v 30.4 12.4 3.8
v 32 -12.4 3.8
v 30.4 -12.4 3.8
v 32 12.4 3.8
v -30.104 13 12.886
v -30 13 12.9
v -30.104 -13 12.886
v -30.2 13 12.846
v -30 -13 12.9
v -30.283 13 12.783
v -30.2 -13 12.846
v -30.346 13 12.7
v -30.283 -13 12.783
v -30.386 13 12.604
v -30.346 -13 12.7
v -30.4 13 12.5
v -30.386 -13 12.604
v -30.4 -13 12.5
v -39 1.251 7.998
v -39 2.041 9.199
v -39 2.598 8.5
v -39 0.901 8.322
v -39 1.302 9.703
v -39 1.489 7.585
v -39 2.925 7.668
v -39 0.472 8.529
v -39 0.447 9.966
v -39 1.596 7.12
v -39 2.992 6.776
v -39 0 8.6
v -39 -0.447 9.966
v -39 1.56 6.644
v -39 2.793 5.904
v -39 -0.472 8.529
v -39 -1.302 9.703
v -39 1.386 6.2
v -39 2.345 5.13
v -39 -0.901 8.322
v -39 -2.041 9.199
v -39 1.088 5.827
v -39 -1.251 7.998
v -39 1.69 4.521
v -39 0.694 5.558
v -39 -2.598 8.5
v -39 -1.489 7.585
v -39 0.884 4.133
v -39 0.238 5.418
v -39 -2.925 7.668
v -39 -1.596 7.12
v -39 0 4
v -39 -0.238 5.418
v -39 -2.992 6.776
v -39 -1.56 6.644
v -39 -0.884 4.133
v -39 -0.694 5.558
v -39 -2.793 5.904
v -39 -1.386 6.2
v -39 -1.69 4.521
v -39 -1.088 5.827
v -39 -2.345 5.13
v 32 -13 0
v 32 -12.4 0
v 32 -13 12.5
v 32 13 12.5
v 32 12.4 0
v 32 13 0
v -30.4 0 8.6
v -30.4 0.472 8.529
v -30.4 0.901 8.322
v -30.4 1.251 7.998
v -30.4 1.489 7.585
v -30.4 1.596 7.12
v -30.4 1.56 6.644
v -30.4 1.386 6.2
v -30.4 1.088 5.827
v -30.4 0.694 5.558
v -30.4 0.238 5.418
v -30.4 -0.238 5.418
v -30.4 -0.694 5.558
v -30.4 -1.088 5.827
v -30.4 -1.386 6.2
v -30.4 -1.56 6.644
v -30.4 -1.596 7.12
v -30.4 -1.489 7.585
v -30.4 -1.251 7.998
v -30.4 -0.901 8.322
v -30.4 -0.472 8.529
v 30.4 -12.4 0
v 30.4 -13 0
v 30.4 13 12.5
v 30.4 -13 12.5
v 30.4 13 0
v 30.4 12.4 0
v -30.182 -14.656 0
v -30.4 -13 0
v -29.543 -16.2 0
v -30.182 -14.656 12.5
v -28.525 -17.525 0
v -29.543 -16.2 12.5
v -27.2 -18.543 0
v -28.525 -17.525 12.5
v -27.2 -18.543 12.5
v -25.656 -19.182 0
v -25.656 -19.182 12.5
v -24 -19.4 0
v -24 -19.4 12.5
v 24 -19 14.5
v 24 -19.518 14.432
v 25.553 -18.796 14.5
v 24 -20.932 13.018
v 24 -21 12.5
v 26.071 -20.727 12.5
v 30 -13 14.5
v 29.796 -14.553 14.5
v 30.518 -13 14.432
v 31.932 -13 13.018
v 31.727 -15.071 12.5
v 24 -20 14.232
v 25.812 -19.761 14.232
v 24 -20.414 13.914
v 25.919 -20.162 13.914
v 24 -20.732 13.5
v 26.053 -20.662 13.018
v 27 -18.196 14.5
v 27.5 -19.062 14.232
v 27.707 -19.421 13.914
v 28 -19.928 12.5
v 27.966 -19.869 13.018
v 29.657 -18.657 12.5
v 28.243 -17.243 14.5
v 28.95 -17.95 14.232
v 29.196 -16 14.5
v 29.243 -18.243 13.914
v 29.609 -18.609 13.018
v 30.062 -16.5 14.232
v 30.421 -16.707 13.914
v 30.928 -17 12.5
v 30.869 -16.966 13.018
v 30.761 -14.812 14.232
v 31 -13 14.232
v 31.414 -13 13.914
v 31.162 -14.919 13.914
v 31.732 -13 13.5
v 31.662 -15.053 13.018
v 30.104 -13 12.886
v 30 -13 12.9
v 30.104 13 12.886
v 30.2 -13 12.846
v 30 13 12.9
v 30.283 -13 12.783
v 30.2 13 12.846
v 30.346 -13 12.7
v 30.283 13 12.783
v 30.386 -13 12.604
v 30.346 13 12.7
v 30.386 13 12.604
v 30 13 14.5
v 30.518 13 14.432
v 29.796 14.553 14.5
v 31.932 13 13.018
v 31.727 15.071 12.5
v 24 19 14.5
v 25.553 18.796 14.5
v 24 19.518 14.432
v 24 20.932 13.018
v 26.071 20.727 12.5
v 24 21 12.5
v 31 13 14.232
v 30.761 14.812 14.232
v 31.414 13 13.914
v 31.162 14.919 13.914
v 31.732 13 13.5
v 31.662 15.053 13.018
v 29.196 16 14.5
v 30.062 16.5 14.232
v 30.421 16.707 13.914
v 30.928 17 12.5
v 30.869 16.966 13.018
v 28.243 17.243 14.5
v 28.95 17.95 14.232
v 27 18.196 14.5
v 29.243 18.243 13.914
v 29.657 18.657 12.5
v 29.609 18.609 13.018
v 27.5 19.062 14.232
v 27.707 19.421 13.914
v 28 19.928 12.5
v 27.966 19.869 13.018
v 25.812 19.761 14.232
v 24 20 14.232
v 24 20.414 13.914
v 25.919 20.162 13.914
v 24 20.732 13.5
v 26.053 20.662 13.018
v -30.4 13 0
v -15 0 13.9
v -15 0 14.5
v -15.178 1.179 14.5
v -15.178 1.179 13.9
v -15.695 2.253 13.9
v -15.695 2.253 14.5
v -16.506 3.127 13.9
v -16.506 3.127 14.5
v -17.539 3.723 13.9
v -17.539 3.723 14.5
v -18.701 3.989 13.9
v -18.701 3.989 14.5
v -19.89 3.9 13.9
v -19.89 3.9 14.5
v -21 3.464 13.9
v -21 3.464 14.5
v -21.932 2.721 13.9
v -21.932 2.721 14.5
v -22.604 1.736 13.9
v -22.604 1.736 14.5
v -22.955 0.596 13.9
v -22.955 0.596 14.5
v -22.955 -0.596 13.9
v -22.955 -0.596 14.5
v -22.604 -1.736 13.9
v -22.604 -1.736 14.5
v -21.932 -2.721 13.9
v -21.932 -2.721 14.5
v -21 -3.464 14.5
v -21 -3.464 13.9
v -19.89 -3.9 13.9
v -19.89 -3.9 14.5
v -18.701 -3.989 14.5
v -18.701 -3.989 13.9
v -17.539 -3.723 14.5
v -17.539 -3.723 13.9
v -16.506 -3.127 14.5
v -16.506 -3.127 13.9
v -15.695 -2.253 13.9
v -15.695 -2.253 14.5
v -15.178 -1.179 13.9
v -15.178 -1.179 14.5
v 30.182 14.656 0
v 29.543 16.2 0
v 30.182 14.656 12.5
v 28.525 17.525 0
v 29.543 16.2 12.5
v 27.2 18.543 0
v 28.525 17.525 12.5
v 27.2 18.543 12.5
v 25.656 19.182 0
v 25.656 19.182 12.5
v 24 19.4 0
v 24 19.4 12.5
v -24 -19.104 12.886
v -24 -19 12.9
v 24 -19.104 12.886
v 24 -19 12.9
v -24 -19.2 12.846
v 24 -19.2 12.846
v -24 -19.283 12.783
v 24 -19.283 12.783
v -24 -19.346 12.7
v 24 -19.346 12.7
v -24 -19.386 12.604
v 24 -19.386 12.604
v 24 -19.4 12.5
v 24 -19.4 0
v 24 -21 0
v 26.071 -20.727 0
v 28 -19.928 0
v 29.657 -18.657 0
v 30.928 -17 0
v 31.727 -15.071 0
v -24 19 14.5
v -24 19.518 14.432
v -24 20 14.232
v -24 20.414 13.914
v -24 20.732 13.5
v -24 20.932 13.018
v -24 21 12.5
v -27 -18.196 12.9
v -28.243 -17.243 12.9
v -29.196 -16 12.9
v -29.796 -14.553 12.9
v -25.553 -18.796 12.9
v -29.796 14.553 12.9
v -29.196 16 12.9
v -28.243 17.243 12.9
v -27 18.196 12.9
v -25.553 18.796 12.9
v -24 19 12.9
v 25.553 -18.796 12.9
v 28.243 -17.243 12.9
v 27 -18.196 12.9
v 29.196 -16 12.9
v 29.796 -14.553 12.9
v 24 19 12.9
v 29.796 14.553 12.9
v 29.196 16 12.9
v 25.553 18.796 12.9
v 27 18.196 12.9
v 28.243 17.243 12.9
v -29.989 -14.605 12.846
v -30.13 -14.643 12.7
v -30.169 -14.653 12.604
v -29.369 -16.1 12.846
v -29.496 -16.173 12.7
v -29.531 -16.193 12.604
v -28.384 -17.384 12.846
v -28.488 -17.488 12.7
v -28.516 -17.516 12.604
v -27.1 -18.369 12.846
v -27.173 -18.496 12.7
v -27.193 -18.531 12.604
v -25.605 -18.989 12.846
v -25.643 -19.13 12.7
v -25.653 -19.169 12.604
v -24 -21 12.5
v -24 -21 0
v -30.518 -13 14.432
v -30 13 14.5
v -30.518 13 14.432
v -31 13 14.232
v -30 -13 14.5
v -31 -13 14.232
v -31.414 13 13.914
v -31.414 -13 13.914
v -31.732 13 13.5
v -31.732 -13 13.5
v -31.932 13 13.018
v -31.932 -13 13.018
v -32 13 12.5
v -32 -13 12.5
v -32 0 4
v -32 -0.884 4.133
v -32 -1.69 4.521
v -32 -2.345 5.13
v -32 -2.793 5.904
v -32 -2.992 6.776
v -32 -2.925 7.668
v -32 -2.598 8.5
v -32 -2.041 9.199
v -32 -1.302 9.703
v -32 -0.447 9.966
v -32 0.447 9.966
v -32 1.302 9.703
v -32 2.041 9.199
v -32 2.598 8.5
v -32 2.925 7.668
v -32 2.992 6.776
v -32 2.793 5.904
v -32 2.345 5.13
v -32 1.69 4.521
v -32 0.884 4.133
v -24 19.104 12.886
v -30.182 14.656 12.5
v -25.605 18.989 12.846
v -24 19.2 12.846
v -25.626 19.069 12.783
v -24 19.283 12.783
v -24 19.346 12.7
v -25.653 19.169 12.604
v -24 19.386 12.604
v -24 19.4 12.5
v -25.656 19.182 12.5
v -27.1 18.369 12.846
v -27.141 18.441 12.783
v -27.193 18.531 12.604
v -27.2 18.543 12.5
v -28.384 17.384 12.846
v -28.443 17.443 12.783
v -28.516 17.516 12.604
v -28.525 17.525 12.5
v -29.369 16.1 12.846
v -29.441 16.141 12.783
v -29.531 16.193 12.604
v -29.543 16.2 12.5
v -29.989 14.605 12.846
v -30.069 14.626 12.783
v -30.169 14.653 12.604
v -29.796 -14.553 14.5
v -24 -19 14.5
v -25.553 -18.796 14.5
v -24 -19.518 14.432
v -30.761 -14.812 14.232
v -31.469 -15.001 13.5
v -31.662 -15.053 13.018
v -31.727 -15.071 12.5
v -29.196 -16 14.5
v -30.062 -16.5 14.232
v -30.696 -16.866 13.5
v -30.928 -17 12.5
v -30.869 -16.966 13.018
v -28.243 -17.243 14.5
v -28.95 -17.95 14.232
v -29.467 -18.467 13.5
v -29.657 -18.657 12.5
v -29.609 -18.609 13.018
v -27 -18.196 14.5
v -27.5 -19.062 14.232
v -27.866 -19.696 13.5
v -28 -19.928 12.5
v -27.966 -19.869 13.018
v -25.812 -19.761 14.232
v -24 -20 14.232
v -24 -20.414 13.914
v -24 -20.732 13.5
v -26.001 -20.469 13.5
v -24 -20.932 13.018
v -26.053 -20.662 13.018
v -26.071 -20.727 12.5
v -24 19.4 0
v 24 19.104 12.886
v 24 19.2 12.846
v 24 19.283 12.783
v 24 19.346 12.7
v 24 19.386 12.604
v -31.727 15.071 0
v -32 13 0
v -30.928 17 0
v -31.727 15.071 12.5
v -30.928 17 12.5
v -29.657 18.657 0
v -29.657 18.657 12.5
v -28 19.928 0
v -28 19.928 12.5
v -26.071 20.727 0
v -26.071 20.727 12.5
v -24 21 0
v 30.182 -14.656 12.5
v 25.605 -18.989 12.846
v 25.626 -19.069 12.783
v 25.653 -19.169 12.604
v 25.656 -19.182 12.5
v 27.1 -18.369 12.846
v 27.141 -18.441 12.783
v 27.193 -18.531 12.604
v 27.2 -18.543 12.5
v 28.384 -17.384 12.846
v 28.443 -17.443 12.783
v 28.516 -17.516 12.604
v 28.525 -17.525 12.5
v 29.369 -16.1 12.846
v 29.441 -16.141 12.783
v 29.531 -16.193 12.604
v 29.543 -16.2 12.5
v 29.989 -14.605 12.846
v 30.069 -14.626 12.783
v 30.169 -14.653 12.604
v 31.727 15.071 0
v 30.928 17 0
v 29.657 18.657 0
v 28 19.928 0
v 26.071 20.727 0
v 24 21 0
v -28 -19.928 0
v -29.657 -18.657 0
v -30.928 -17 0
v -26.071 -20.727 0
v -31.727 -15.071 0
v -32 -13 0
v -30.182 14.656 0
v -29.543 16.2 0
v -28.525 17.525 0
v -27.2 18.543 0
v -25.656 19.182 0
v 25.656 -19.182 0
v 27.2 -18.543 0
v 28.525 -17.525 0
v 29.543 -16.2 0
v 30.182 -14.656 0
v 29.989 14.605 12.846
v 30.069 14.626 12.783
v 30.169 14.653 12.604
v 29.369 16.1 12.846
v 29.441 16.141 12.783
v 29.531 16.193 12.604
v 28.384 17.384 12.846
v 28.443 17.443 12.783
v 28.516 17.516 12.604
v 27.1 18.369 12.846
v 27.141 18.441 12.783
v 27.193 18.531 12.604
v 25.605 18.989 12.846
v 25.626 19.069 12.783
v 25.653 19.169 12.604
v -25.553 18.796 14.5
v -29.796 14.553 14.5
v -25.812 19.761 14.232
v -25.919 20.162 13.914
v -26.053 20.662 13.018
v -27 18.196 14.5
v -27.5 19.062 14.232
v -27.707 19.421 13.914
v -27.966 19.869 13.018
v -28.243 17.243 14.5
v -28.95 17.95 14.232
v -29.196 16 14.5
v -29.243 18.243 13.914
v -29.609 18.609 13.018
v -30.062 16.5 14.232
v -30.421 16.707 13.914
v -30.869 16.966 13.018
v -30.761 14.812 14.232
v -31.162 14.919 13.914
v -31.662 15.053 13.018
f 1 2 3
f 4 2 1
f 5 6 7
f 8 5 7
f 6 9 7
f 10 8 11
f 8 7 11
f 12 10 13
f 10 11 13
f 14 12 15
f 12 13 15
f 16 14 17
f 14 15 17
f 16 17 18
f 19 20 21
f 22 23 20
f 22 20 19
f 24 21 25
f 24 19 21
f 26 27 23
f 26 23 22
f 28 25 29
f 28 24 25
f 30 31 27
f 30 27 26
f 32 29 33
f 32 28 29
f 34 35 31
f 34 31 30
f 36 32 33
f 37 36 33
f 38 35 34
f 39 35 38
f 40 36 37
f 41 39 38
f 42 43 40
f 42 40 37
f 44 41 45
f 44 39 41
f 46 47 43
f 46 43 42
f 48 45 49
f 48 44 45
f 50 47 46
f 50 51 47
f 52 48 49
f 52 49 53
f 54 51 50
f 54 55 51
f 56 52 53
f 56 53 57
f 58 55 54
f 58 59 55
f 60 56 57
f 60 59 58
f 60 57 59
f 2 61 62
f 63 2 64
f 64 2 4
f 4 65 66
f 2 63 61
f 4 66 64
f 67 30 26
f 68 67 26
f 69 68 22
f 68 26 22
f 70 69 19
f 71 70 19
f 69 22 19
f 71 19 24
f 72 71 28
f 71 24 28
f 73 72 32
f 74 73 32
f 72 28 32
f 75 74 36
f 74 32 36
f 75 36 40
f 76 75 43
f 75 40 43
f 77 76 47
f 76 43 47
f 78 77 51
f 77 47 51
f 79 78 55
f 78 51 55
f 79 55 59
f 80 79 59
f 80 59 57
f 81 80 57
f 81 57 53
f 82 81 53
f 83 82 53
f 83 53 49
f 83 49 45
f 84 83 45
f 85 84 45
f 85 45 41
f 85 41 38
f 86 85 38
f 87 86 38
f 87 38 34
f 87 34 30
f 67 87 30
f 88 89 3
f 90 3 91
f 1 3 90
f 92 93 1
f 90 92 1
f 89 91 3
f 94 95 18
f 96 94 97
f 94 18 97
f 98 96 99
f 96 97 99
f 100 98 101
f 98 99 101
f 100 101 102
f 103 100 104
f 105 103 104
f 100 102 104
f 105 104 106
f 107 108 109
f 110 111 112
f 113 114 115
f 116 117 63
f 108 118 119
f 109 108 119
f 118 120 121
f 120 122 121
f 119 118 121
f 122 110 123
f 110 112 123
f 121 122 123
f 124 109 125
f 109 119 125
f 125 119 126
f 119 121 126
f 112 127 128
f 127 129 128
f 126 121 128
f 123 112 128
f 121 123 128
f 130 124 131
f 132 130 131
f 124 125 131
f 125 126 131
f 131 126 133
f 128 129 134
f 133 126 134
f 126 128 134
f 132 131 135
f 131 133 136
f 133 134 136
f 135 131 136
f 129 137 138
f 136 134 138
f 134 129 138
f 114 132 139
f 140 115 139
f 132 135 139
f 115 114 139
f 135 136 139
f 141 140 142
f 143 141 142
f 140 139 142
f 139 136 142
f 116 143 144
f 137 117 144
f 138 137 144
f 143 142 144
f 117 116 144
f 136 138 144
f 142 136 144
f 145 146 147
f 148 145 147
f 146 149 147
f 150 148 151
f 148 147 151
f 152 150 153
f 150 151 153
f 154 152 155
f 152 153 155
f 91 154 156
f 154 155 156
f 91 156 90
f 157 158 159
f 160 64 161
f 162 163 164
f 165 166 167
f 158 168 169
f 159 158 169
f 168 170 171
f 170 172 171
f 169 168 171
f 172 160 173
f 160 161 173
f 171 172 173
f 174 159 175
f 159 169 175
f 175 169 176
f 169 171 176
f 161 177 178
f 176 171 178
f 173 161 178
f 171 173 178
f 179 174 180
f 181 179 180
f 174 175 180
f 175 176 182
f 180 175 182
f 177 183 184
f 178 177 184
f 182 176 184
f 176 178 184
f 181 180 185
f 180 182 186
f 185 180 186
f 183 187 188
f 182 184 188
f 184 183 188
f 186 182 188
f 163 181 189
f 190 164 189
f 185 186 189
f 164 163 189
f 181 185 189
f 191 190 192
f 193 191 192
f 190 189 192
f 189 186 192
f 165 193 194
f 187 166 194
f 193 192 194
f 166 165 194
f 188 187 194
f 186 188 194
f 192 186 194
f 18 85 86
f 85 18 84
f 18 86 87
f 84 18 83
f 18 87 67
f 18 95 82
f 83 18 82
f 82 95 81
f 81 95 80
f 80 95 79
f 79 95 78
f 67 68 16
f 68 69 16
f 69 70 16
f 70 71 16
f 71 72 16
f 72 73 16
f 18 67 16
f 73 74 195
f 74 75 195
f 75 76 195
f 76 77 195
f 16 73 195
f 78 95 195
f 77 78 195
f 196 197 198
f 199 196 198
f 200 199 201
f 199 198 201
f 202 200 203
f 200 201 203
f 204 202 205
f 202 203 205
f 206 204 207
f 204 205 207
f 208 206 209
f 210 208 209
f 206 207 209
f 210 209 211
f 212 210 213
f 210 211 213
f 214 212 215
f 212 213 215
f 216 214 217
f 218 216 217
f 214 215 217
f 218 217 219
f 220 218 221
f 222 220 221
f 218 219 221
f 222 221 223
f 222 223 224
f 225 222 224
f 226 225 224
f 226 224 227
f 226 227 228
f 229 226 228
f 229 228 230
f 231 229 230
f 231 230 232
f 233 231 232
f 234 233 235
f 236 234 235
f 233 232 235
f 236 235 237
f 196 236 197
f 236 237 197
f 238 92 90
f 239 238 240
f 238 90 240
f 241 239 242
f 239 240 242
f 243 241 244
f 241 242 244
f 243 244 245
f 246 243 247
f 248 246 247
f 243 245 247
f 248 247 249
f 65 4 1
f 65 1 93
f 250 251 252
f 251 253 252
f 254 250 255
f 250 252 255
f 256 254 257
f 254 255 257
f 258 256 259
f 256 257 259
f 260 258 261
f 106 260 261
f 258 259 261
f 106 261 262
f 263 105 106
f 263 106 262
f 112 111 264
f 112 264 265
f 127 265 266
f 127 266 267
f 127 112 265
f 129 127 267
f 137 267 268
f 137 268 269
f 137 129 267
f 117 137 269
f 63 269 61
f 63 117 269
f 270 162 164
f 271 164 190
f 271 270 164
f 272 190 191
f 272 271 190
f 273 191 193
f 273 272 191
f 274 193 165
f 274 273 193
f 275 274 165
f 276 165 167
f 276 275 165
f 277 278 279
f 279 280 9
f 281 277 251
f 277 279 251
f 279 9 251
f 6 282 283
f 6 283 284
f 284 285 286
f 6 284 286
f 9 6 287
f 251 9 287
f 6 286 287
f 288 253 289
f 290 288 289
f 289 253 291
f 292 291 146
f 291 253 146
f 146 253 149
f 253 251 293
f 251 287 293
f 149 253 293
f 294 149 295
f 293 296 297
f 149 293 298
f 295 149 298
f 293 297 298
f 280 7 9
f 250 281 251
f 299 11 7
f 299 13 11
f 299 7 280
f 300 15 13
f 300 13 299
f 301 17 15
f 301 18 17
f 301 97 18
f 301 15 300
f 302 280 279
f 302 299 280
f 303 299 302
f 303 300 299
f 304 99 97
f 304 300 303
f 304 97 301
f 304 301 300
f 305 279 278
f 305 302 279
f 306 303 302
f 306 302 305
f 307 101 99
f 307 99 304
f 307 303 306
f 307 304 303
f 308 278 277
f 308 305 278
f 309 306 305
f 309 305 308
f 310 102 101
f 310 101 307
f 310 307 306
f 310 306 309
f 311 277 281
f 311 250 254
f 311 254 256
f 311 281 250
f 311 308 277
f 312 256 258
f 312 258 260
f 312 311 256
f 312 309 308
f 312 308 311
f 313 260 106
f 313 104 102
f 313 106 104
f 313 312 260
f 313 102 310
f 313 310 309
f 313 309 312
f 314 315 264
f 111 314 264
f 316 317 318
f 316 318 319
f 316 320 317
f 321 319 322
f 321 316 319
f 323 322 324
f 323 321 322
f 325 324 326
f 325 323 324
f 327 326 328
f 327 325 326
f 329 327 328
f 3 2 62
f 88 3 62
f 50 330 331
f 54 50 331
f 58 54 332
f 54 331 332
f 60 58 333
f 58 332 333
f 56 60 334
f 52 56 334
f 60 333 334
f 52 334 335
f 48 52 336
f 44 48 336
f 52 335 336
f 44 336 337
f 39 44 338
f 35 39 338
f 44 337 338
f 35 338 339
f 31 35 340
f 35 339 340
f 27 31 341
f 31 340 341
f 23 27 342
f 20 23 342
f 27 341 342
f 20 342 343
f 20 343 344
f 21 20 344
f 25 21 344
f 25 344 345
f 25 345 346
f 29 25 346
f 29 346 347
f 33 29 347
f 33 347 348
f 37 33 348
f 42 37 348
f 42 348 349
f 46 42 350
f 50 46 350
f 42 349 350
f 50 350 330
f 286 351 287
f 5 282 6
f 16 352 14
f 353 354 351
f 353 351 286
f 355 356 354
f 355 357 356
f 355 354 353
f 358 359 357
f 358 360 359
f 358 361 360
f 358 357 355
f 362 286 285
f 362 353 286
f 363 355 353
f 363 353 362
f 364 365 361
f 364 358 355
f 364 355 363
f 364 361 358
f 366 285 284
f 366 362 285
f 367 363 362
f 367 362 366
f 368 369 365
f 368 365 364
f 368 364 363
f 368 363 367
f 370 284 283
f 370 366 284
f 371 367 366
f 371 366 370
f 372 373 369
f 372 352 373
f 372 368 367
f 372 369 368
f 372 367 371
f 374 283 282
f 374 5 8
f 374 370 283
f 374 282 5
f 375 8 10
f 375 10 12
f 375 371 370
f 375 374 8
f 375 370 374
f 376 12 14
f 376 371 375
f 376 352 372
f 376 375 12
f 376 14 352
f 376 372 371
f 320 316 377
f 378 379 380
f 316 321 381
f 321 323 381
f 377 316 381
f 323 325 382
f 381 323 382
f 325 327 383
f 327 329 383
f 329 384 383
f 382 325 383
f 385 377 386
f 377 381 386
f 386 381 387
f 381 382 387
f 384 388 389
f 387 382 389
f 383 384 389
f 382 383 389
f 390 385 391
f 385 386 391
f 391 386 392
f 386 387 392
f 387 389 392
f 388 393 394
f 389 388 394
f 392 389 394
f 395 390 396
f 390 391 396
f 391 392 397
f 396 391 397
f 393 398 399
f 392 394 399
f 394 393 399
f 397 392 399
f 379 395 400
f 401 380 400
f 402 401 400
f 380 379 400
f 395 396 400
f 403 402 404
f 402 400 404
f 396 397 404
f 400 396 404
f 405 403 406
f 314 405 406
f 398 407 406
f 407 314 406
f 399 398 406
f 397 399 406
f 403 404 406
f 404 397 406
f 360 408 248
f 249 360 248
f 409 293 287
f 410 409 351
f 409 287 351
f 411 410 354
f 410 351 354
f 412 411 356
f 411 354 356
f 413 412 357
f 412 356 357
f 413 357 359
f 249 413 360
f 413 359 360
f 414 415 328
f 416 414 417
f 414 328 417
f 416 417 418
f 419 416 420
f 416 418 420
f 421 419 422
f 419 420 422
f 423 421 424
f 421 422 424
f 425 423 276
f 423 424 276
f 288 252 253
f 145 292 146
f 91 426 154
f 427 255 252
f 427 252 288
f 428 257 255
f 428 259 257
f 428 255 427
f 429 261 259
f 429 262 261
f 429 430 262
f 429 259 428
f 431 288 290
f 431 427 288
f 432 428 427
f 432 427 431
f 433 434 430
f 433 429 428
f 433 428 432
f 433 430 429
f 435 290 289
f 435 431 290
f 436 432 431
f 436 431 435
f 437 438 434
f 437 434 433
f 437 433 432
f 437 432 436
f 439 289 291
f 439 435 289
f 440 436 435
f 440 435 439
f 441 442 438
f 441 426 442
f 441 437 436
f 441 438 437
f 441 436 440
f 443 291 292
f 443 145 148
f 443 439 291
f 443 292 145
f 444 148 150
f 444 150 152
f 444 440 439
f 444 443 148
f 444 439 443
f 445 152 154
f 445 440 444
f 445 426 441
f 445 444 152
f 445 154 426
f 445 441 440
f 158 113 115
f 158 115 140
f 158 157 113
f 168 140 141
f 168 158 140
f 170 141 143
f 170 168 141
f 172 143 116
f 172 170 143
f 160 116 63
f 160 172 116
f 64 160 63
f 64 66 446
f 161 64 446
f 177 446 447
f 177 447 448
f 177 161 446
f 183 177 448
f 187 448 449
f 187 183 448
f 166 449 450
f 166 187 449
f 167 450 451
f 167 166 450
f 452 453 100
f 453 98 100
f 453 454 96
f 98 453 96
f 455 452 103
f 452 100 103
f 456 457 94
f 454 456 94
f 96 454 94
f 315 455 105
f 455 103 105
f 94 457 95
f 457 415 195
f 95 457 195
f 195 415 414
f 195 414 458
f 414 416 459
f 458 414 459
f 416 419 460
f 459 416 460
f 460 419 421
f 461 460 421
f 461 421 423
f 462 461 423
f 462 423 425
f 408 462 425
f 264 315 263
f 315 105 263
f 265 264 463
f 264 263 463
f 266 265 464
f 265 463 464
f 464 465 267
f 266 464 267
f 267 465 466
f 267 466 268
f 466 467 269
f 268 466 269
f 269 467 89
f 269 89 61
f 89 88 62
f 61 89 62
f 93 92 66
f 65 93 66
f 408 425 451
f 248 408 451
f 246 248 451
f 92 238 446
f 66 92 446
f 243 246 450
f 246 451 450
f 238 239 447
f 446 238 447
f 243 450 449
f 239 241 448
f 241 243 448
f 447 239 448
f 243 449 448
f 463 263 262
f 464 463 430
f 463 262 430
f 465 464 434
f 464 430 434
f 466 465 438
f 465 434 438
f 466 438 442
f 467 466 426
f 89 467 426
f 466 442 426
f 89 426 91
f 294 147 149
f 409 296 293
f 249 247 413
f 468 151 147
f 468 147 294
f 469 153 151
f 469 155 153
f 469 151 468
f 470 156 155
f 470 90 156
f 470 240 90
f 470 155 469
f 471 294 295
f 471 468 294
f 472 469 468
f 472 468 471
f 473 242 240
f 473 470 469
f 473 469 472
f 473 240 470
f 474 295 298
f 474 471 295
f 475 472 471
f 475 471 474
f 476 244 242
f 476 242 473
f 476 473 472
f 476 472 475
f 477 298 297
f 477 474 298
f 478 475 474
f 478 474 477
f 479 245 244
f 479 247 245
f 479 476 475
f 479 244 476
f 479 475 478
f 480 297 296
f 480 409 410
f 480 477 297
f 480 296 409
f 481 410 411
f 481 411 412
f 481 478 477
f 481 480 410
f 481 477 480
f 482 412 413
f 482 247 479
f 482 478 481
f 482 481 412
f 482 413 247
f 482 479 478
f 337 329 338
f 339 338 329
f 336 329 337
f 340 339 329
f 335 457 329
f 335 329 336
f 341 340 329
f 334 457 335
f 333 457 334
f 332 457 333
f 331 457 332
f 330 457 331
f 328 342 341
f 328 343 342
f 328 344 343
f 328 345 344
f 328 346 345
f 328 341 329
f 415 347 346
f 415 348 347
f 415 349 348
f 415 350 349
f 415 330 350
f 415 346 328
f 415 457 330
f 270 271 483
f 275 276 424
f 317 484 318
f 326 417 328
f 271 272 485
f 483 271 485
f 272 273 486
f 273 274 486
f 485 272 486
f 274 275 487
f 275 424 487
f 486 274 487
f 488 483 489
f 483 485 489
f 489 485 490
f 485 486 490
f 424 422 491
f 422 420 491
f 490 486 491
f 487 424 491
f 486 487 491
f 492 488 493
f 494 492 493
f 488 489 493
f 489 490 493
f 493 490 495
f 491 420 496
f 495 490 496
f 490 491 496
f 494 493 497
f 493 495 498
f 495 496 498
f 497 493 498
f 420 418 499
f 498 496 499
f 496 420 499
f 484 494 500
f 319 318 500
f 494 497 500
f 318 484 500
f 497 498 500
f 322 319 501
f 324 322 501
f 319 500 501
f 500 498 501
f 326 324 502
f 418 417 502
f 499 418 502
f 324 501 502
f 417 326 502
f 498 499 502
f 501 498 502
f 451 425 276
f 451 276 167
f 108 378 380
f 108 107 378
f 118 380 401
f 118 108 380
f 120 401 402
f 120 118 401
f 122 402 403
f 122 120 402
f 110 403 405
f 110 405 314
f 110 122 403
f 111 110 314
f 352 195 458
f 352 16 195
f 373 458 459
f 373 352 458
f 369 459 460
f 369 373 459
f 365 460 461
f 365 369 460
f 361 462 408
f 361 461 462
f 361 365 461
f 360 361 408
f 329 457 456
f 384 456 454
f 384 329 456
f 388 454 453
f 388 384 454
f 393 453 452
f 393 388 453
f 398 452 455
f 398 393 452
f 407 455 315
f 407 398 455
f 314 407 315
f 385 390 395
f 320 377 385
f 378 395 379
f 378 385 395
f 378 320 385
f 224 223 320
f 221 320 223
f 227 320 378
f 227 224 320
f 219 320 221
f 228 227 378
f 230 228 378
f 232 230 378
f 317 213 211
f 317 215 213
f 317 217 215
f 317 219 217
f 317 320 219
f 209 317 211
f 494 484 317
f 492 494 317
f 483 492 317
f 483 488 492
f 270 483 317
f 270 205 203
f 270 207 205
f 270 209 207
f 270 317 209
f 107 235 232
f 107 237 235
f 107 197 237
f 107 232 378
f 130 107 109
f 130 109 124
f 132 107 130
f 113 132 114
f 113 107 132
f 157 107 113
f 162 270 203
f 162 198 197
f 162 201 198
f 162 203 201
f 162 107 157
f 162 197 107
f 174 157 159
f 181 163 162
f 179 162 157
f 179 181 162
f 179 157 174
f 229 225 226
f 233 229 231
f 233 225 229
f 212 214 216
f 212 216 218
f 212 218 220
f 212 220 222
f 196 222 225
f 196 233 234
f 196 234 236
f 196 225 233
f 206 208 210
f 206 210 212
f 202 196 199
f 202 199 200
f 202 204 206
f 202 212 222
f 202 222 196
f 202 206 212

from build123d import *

# Parameters (mm, degrees)
SKETCH1_W           = 64
SKETCH1_H           = 42
BOSS_EXTRUDE1_DEPTH = 14.5
FILLET1_R           = 8
FILLET2_R           = 2
SHELL1_T            = -1.6
CUT_EXTRUDE1_REACH  = 70.9
SKETCH2_W           = 3.8
SKETCH2_H           = 24.8
SKETCH3_R           = 3
BOSS_EXTRUDE2_DEPTH = 7.000000018
CUT_EXTRUDE2_REACH  = 77.447
SKETCH4_R           = 1.6
SKETCH5_R           = 4
CUT_EXTRUDE3_DEPTH  = 0.6


with BuildPart() as part:
    # Sketch1 → Boss-Extrude1 (new body)
    with BuildSketch(Plane.XY):
        Rectangle(SKETCH1_W, SKETCH1_H)
    extrude(amount=BOSS_EXTRUDE1_DEPTH)

    # Fillet1
    fillet1_edges = [part.edges().sort_by_distance(p)[0] for p in [
        (-32, 21, 7.25),
        (32, 21, 7.25),
        (32, -21, 7.25),
        (-32, -21, 7.25),
    ]]
    fillet(fillet1_edges, radius=FILLET1_R)

    # Fillet2
    fillet2_edges = [part.edges().sort_by_distance(p)[0] for p in [
        (0, -21, 14.5),
        (-32, 0, 14.5),
        (32, 0, 14.5),
        (0, 21, 14.5),
        (29.656854249, 18.656854249, 14.5),
        (-29.656854249, 18.656854249, 14.5),
        (29.656854249, -18.656854249, 14.5),
        (-29.656854249, -18.656854249, 14.5),
    ]]
    fillet(fillet2_edges, radius=FILLET2_R)

    # Shell1
    shell1_openings = [part.faces().sort_by_distance(p)[0] for p in [
        (0, 0, 0),
    ]]
    offset(amount=SHELL1_T, openings=shell1_openings, kind=Kind.INTERSECTION)

    # Sketch2 → Cut-Extrude1 (cut, up to next)
    with BuildSketch(Plane(origin=(32, 0, 0), x_dir=(0, 0, -1), z_dir=(1, 0, 0)), mode=Mode.PRIVATE) as cut_extrude1_sk1:
        with Locations((-1.9, 0)):
            Rectangle(SKETCH2_W, SKETCH2_H)
    cut_extrude1_tool1 = extrude(cut_extrude1_sk1.sketch, amount=-CUT_EXTRUDE1_REACH, mode=Mode.PRIVATE) & part.part
    add(cut_extrude1_tool1.solids().sort_by_distance((32, 0, 1.9))[0], mode=Mode.SUBTRACT)

    # Sketch3 → Boss-Extrude2 (add)
    with BuildSketch(Plane.ZY.offset(32)):
        with Locations(Location((7, 0, 0), (0, 0, 180))):
            Circle(SKETCH3_R)
    extrude(amount=BOSS_EXTRUDE2_DEPTH)

    # Sketch4 → Cut-Extrude2 (cut, up to next)
    with BuildSketch(Plane.ZY.offset(39.000000018), mode=Mode.PRIVATE) as cut_extrude2_sk1:
        with Locations((7, 0)):
            Circle(SKETCH4_R)
    cut_extrude2_tool1 = extrude(cut_extrude2_sk1.sketch, amount=-CUT_EXTRUDE2_REACH, mode=Mode.PRIVATE) & part.part
    add(cut_extrude2_tool1.solids().sort_by_distance((-39, 0, 7))[0], mode=Mode.SUBTRACT)

    # Sketch5 → Cut-Extrude3 (cut)
    with BuildSketch(Plane.XY.offset(14.5)):
        with Locations((-19, 0)):
            Circle(SKETCH5_R)
    extrude(amount=-CUT_EXTRUDE3_DEPTH, mode=Mode.SUBTRACT)


solid = part.part
